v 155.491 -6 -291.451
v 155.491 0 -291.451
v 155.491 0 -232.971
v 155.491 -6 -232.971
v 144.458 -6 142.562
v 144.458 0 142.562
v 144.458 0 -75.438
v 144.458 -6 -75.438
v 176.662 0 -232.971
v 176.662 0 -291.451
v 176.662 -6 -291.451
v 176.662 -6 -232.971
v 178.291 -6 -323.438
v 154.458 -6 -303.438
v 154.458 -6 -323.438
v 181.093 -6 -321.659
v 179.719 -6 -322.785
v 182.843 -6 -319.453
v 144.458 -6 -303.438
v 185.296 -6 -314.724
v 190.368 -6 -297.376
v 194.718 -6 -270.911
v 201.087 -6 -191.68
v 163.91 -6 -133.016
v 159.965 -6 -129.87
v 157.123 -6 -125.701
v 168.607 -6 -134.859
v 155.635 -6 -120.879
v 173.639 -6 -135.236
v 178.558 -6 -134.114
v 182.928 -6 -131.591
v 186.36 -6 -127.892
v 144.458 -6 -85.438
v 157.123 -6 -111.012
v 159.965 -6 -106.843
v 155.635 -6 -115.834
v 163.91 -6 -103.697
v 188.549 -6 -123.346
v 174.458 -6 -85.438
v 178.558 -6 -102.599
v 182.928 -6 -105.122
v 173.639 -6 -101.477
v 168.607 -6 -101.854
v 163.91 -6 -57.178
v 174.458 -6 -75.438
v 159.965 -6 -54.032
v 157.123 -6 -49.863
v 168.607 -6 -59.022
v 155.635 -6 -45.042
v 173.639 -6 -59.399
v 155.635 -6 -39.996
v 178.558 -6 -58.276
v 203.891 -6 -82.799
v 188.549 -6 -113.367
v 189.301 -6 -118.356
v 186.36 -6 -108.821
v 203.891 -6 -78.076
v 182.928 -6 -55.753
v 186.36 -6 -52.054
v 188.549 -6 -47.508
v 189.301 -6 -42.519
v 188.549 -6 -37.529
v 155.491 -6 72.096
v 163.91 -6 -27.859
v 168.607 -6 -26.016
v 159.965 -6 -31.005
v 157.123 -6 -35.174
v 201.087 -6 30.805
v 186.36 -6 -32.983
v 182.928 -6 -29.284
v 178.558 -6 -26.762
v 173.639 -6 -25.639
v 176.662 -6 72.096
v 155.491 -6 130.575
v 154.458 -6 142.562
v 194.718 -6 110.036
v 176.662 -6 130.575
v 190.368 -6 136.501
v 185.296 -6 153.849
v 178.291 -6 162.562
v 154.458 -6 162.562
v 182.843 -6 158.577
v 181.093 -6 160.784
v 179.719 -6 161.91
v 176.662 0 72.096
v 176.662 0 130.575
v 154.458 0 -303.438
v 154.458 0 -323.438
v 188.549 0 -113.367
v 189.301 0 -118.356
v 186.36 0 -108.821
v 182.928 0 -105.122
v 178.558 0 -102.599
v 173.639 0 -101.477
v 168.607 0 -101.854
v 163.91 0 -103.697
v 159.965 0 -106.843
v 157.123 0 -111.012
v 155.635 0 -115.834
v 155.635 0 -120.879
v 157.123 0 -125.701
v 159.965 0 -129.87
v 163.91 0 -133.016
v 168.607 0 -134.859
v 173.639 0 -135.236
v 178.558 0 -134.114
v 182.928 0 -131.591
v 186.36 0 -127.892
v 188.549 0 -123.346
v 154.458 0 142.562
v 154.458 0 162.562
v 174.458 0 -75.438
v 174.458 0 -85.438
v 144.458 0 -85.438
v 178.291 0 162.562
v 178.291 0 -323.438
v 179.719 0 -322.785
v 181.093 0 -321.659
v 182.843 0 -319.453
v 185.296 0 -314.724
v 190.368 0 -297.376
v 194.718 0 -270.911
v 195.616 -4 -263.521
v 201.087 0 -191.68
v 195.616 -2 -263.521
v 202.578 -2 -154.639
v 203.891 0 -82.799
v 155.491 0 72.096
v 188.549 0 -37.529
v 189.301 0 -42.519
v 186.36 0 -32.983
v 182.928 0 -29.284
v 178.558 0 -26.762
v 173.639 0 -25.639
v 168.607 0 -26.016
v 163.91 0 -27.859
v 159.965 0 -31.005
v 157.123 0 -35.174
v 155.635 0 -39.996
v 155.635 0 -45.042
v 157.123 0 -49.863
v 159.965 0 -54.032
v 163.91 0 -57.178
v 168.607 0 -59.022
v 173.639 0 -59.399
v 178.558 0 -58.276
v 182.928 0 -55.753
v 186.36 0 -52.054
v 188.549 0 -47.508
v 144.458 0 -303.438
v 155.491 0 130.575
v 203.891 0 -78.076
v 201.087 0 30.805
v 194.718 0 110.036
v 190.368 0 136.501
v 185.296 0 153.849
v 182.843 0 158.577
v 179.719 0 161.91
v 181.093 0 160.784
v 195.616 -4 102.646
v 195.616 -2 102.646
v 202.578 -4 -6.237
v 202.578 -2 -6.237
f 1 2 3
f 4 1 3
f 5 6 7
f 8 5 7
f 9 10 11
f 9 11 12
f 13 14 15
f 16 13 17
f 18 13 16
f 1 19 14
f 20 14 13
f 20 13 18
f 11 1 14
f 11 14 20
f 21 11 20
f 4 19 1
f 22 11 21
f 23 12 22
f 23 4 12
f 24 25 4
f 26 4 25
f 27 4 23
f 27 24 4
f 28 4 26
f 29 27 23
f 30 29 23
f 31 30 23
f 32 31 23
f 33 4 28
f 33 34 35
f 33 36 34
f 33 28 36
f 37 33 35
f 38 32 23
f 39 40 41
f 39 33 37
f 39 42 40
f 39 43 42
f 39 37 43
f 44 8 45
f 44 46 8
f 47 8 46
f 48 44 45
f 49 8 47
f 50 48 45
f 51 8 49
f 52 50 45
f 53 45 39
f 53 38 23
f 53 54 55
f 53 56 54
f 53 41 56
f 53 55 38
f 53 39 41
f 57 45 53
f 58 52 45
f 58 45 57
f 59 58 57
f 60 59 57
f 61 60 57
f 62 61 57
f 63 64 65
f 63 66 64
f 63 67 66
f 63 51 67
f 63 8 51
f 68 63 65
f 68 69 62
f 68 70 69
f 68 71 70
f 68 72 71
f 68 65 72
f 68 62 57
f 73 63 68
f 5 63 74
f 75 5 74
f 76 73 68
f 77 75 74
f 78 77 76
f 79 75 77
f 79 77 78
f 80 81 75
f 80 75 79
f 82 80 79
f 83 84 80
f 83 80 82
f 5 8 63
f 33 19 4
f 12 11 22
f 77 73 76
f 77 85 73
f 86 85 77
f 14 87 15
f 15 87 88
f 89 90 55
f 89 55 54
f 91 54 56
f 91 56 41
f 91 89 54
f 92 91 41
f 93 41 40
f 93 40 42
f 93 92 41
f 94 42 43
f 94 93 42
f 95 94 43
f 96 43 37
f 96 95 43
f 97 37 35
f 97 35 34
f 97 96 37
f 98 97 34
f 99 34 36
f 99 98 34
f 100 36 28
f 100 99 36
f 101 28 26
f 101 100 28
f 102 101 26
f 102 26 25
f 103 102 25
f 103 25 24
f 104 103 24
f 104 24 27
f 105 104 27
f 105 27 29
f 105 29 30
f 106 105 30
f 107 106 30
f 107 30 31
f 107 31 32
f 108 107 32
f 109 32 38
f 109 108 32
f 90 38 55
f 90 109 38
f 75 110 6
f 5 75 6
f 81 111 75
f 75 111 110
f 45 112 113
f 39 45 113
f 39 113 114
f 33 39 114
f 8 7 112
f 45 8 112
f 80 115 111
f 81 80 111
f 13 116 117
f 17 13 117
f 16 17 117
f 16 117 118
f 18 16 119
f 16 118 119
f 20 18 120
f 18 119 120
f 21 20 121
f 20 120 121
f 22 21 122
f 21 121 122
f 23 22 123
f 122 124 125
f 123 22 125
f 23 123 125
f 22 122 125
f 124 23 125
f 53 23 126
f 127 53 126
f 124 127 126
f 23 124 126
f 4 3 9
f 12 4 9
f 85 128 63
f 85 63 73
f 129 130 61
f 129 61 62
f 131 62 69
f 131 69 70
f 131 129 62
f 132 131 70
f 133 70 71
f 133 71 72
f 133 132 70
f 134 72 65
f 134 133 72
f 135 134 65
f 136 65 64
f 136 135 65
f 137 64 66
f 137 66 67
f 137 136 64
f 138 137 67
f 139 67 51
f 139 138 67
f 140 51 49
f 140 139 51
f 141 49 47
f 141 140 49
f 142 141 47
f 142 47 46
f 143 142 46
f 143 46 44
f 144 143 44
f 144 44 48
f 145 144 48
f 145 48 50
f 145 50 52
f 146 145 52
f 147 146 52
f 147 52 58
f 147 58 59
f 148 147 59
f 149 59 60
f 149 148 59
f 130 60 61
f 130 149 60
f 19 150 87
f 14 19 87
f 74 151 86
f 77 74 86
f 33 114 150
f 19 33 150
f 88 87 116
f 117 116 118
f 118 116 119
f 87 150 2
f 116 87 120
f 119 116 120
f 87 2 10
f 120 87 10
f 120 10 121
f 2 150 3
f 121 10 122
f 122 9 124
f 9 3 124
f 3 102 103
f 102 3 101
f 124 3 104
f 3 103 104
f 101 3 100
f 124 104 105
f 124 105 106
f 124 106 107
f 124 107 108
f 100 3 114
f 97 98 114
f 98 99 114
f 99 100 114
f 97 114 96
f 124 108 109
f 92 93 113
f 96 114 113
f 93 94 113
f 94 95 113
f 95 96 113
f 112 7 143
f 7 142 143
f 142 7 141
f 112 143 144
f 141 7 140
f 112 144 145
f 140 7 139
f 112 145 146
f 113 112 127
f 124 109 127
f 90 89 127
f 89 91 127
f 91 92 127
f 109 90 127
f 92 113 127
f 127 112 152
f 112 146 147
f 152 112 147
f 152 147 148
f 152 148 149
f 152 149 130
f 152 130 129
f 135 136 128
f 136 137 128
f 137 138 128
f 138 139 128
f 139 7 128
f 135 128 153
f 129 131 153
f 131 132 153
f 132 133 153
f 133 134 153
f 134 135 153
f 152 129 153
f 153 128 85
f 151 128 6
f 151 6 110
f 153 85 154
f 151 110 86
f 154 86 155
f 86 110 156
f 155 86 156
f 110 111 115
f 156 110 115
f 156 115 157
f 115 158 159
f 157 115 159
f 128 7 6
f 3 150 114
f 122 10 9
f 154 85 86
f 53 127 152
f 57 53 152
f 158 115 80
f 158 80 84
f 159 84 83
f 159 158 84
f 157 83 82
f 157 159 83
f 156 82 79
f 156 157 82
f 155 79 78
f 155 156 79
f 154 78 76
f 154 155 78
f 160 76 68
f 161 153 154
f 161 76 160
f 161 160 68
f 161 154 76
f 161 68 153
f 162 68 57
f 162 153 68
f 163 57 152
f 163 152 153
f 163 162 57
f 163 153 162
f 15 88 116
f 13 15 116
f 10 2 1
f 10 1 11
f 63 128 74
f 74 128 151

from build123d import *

# Parameters (mm, degrees)
F0_W     = 21.1715102196
F0_H     = 58.4797523916
F0_R     = 16.9272487263
F1_DEPTH = 6


with BuildPart() as f1:
    # F0 (on Front) → F1 (new body)
    with BuildSketch(Plane.XZ):
        with BuildLine():
            Line((203.8914743591, -81.3288328435), (203.8914743591, -80.4375457843))
            Line((203.8914743591, -80.4375457843), (174.4579714171, -80.4375457843))
            Line((174.4579714171, -80.4375457843), (174.4579714171, -85.4375457843))
            Line((174.4579714171, -85.4375457843), (144.4579714171, -85.4375457843))
            Line((144.4579714171, -85.4375457843), (144.4579714171, -303.4375457843))
            Line((144.4579714171, -303.4375457843), (154.4579714171, -303.4375457843))
            Line((154.4579714171, -303.4375457843), (154.4579714171, -323.4375457843))
            Line((154.4579714171, -323.4375457843), (178.2914743591, -323.4375457843))
            add(Edge.make_bspline(
                [(178.2914743591, -323.4375457843), (202.3683447271, -316.6747764881), (203.8304484738, -107.4468228501), (203.8914743591, -82.7989785763)],
                knots=[0, 0, 0, 0, 229.5065578532, 229.5065578532, 229.5065578532, 229.5065578532], degree=3))
            Line((203.8914743591, -82.7989785763), (203.8914743591, -81.3288328435))
        make_face()
        with Locations((166.0767396396, -262.2106793639)):
            Rectangle(F0_W, F0_H, mode=Mode.SUBTRACT)
        with Locations((172.373637557, -118.3564311424)):
            Circle(F0_R, mode=Mode.SUBTRACT)
        with BuildLine():
            add(Edge.make_bspline(
                [(203.8914743591, -78.0761129922), (203.895419842, -79.6696605209), (203.8935088751, -80.4916705159), (203.8914743591, -80.4375457843)],
                knots=[229.5065578531, 229.5065578531, 229.5065578531, 229.5065578531, 244.3447564406, 244.3447564406, 244.3447564406, 244.3447564406], degree=3))
            add(Edge.make_bspline(
                [(178.2914743591, 162.5624542157), (202.3683447271, 155.7996849196), (203.8304484738, -53.4282687183), (203.8914743591, -78.0761129922)],
                knots=[0, 0, 0, 0, 229.5065578531, 229.5065578531, 229.5065578531, 229.5065578531], degree=3))
            Line((178.2914743591, 162.5624542157), (154.4579714171, 162.5624542157))
            Line((154.4579714171, 162.5624542157), (154.4579714171, 142.5624542157))
            Line((154.4579714171, 142.5624542157), (144.4579714171, 142.5624542157))
            Line((144.4579714171, 142.5624542157), (144.4579714171, -75.4375457843))
            Line((144.4579714171, -75.4375457843), (174.4579714171, -75.4375457843))
            Line((174.4579714171, -75.4375457843), (174.4579714171, -80.4375457843))
            Line((174.4579714171, -80.4375457843), (203.8914743591, -80.4375457843))
        make_face()
        with Locations((172.373637557, -42.5186604261)):
            Circle(F0_R, mode=Mode.SUBTRACT)
        with Locations((166.0767396396, 101.3355877954)):
            Rectangle(F0_W, F0_H, mode=Mode.SUBTRACT)
        with BuildLine():
            Line((203.8914743591, -79.546258725), (203.8914743591, -78.0761129922))
            add(Edge.make_bspline(
                [(203.8914743591, -78.0761129922), (203.895419842, -79.6696605209), (203.8935088751, -80.4916705159), (203.8914743591, -80.4375457843)],
                knots=[229.5065578531, 229.5065578531, 229.5065578531, 229.5065578531, 244.3447564406, 244.3447564406, 244.3447564406, 244.3447564406], degree=3))
            Line((203.8914743591, -80.4375457843), (203.8914743591, -79.546258725))
        make_face(mode=Mode.SUBTRACT)
    extrude(amount=F1_DEPTH)


solid = f1.part
